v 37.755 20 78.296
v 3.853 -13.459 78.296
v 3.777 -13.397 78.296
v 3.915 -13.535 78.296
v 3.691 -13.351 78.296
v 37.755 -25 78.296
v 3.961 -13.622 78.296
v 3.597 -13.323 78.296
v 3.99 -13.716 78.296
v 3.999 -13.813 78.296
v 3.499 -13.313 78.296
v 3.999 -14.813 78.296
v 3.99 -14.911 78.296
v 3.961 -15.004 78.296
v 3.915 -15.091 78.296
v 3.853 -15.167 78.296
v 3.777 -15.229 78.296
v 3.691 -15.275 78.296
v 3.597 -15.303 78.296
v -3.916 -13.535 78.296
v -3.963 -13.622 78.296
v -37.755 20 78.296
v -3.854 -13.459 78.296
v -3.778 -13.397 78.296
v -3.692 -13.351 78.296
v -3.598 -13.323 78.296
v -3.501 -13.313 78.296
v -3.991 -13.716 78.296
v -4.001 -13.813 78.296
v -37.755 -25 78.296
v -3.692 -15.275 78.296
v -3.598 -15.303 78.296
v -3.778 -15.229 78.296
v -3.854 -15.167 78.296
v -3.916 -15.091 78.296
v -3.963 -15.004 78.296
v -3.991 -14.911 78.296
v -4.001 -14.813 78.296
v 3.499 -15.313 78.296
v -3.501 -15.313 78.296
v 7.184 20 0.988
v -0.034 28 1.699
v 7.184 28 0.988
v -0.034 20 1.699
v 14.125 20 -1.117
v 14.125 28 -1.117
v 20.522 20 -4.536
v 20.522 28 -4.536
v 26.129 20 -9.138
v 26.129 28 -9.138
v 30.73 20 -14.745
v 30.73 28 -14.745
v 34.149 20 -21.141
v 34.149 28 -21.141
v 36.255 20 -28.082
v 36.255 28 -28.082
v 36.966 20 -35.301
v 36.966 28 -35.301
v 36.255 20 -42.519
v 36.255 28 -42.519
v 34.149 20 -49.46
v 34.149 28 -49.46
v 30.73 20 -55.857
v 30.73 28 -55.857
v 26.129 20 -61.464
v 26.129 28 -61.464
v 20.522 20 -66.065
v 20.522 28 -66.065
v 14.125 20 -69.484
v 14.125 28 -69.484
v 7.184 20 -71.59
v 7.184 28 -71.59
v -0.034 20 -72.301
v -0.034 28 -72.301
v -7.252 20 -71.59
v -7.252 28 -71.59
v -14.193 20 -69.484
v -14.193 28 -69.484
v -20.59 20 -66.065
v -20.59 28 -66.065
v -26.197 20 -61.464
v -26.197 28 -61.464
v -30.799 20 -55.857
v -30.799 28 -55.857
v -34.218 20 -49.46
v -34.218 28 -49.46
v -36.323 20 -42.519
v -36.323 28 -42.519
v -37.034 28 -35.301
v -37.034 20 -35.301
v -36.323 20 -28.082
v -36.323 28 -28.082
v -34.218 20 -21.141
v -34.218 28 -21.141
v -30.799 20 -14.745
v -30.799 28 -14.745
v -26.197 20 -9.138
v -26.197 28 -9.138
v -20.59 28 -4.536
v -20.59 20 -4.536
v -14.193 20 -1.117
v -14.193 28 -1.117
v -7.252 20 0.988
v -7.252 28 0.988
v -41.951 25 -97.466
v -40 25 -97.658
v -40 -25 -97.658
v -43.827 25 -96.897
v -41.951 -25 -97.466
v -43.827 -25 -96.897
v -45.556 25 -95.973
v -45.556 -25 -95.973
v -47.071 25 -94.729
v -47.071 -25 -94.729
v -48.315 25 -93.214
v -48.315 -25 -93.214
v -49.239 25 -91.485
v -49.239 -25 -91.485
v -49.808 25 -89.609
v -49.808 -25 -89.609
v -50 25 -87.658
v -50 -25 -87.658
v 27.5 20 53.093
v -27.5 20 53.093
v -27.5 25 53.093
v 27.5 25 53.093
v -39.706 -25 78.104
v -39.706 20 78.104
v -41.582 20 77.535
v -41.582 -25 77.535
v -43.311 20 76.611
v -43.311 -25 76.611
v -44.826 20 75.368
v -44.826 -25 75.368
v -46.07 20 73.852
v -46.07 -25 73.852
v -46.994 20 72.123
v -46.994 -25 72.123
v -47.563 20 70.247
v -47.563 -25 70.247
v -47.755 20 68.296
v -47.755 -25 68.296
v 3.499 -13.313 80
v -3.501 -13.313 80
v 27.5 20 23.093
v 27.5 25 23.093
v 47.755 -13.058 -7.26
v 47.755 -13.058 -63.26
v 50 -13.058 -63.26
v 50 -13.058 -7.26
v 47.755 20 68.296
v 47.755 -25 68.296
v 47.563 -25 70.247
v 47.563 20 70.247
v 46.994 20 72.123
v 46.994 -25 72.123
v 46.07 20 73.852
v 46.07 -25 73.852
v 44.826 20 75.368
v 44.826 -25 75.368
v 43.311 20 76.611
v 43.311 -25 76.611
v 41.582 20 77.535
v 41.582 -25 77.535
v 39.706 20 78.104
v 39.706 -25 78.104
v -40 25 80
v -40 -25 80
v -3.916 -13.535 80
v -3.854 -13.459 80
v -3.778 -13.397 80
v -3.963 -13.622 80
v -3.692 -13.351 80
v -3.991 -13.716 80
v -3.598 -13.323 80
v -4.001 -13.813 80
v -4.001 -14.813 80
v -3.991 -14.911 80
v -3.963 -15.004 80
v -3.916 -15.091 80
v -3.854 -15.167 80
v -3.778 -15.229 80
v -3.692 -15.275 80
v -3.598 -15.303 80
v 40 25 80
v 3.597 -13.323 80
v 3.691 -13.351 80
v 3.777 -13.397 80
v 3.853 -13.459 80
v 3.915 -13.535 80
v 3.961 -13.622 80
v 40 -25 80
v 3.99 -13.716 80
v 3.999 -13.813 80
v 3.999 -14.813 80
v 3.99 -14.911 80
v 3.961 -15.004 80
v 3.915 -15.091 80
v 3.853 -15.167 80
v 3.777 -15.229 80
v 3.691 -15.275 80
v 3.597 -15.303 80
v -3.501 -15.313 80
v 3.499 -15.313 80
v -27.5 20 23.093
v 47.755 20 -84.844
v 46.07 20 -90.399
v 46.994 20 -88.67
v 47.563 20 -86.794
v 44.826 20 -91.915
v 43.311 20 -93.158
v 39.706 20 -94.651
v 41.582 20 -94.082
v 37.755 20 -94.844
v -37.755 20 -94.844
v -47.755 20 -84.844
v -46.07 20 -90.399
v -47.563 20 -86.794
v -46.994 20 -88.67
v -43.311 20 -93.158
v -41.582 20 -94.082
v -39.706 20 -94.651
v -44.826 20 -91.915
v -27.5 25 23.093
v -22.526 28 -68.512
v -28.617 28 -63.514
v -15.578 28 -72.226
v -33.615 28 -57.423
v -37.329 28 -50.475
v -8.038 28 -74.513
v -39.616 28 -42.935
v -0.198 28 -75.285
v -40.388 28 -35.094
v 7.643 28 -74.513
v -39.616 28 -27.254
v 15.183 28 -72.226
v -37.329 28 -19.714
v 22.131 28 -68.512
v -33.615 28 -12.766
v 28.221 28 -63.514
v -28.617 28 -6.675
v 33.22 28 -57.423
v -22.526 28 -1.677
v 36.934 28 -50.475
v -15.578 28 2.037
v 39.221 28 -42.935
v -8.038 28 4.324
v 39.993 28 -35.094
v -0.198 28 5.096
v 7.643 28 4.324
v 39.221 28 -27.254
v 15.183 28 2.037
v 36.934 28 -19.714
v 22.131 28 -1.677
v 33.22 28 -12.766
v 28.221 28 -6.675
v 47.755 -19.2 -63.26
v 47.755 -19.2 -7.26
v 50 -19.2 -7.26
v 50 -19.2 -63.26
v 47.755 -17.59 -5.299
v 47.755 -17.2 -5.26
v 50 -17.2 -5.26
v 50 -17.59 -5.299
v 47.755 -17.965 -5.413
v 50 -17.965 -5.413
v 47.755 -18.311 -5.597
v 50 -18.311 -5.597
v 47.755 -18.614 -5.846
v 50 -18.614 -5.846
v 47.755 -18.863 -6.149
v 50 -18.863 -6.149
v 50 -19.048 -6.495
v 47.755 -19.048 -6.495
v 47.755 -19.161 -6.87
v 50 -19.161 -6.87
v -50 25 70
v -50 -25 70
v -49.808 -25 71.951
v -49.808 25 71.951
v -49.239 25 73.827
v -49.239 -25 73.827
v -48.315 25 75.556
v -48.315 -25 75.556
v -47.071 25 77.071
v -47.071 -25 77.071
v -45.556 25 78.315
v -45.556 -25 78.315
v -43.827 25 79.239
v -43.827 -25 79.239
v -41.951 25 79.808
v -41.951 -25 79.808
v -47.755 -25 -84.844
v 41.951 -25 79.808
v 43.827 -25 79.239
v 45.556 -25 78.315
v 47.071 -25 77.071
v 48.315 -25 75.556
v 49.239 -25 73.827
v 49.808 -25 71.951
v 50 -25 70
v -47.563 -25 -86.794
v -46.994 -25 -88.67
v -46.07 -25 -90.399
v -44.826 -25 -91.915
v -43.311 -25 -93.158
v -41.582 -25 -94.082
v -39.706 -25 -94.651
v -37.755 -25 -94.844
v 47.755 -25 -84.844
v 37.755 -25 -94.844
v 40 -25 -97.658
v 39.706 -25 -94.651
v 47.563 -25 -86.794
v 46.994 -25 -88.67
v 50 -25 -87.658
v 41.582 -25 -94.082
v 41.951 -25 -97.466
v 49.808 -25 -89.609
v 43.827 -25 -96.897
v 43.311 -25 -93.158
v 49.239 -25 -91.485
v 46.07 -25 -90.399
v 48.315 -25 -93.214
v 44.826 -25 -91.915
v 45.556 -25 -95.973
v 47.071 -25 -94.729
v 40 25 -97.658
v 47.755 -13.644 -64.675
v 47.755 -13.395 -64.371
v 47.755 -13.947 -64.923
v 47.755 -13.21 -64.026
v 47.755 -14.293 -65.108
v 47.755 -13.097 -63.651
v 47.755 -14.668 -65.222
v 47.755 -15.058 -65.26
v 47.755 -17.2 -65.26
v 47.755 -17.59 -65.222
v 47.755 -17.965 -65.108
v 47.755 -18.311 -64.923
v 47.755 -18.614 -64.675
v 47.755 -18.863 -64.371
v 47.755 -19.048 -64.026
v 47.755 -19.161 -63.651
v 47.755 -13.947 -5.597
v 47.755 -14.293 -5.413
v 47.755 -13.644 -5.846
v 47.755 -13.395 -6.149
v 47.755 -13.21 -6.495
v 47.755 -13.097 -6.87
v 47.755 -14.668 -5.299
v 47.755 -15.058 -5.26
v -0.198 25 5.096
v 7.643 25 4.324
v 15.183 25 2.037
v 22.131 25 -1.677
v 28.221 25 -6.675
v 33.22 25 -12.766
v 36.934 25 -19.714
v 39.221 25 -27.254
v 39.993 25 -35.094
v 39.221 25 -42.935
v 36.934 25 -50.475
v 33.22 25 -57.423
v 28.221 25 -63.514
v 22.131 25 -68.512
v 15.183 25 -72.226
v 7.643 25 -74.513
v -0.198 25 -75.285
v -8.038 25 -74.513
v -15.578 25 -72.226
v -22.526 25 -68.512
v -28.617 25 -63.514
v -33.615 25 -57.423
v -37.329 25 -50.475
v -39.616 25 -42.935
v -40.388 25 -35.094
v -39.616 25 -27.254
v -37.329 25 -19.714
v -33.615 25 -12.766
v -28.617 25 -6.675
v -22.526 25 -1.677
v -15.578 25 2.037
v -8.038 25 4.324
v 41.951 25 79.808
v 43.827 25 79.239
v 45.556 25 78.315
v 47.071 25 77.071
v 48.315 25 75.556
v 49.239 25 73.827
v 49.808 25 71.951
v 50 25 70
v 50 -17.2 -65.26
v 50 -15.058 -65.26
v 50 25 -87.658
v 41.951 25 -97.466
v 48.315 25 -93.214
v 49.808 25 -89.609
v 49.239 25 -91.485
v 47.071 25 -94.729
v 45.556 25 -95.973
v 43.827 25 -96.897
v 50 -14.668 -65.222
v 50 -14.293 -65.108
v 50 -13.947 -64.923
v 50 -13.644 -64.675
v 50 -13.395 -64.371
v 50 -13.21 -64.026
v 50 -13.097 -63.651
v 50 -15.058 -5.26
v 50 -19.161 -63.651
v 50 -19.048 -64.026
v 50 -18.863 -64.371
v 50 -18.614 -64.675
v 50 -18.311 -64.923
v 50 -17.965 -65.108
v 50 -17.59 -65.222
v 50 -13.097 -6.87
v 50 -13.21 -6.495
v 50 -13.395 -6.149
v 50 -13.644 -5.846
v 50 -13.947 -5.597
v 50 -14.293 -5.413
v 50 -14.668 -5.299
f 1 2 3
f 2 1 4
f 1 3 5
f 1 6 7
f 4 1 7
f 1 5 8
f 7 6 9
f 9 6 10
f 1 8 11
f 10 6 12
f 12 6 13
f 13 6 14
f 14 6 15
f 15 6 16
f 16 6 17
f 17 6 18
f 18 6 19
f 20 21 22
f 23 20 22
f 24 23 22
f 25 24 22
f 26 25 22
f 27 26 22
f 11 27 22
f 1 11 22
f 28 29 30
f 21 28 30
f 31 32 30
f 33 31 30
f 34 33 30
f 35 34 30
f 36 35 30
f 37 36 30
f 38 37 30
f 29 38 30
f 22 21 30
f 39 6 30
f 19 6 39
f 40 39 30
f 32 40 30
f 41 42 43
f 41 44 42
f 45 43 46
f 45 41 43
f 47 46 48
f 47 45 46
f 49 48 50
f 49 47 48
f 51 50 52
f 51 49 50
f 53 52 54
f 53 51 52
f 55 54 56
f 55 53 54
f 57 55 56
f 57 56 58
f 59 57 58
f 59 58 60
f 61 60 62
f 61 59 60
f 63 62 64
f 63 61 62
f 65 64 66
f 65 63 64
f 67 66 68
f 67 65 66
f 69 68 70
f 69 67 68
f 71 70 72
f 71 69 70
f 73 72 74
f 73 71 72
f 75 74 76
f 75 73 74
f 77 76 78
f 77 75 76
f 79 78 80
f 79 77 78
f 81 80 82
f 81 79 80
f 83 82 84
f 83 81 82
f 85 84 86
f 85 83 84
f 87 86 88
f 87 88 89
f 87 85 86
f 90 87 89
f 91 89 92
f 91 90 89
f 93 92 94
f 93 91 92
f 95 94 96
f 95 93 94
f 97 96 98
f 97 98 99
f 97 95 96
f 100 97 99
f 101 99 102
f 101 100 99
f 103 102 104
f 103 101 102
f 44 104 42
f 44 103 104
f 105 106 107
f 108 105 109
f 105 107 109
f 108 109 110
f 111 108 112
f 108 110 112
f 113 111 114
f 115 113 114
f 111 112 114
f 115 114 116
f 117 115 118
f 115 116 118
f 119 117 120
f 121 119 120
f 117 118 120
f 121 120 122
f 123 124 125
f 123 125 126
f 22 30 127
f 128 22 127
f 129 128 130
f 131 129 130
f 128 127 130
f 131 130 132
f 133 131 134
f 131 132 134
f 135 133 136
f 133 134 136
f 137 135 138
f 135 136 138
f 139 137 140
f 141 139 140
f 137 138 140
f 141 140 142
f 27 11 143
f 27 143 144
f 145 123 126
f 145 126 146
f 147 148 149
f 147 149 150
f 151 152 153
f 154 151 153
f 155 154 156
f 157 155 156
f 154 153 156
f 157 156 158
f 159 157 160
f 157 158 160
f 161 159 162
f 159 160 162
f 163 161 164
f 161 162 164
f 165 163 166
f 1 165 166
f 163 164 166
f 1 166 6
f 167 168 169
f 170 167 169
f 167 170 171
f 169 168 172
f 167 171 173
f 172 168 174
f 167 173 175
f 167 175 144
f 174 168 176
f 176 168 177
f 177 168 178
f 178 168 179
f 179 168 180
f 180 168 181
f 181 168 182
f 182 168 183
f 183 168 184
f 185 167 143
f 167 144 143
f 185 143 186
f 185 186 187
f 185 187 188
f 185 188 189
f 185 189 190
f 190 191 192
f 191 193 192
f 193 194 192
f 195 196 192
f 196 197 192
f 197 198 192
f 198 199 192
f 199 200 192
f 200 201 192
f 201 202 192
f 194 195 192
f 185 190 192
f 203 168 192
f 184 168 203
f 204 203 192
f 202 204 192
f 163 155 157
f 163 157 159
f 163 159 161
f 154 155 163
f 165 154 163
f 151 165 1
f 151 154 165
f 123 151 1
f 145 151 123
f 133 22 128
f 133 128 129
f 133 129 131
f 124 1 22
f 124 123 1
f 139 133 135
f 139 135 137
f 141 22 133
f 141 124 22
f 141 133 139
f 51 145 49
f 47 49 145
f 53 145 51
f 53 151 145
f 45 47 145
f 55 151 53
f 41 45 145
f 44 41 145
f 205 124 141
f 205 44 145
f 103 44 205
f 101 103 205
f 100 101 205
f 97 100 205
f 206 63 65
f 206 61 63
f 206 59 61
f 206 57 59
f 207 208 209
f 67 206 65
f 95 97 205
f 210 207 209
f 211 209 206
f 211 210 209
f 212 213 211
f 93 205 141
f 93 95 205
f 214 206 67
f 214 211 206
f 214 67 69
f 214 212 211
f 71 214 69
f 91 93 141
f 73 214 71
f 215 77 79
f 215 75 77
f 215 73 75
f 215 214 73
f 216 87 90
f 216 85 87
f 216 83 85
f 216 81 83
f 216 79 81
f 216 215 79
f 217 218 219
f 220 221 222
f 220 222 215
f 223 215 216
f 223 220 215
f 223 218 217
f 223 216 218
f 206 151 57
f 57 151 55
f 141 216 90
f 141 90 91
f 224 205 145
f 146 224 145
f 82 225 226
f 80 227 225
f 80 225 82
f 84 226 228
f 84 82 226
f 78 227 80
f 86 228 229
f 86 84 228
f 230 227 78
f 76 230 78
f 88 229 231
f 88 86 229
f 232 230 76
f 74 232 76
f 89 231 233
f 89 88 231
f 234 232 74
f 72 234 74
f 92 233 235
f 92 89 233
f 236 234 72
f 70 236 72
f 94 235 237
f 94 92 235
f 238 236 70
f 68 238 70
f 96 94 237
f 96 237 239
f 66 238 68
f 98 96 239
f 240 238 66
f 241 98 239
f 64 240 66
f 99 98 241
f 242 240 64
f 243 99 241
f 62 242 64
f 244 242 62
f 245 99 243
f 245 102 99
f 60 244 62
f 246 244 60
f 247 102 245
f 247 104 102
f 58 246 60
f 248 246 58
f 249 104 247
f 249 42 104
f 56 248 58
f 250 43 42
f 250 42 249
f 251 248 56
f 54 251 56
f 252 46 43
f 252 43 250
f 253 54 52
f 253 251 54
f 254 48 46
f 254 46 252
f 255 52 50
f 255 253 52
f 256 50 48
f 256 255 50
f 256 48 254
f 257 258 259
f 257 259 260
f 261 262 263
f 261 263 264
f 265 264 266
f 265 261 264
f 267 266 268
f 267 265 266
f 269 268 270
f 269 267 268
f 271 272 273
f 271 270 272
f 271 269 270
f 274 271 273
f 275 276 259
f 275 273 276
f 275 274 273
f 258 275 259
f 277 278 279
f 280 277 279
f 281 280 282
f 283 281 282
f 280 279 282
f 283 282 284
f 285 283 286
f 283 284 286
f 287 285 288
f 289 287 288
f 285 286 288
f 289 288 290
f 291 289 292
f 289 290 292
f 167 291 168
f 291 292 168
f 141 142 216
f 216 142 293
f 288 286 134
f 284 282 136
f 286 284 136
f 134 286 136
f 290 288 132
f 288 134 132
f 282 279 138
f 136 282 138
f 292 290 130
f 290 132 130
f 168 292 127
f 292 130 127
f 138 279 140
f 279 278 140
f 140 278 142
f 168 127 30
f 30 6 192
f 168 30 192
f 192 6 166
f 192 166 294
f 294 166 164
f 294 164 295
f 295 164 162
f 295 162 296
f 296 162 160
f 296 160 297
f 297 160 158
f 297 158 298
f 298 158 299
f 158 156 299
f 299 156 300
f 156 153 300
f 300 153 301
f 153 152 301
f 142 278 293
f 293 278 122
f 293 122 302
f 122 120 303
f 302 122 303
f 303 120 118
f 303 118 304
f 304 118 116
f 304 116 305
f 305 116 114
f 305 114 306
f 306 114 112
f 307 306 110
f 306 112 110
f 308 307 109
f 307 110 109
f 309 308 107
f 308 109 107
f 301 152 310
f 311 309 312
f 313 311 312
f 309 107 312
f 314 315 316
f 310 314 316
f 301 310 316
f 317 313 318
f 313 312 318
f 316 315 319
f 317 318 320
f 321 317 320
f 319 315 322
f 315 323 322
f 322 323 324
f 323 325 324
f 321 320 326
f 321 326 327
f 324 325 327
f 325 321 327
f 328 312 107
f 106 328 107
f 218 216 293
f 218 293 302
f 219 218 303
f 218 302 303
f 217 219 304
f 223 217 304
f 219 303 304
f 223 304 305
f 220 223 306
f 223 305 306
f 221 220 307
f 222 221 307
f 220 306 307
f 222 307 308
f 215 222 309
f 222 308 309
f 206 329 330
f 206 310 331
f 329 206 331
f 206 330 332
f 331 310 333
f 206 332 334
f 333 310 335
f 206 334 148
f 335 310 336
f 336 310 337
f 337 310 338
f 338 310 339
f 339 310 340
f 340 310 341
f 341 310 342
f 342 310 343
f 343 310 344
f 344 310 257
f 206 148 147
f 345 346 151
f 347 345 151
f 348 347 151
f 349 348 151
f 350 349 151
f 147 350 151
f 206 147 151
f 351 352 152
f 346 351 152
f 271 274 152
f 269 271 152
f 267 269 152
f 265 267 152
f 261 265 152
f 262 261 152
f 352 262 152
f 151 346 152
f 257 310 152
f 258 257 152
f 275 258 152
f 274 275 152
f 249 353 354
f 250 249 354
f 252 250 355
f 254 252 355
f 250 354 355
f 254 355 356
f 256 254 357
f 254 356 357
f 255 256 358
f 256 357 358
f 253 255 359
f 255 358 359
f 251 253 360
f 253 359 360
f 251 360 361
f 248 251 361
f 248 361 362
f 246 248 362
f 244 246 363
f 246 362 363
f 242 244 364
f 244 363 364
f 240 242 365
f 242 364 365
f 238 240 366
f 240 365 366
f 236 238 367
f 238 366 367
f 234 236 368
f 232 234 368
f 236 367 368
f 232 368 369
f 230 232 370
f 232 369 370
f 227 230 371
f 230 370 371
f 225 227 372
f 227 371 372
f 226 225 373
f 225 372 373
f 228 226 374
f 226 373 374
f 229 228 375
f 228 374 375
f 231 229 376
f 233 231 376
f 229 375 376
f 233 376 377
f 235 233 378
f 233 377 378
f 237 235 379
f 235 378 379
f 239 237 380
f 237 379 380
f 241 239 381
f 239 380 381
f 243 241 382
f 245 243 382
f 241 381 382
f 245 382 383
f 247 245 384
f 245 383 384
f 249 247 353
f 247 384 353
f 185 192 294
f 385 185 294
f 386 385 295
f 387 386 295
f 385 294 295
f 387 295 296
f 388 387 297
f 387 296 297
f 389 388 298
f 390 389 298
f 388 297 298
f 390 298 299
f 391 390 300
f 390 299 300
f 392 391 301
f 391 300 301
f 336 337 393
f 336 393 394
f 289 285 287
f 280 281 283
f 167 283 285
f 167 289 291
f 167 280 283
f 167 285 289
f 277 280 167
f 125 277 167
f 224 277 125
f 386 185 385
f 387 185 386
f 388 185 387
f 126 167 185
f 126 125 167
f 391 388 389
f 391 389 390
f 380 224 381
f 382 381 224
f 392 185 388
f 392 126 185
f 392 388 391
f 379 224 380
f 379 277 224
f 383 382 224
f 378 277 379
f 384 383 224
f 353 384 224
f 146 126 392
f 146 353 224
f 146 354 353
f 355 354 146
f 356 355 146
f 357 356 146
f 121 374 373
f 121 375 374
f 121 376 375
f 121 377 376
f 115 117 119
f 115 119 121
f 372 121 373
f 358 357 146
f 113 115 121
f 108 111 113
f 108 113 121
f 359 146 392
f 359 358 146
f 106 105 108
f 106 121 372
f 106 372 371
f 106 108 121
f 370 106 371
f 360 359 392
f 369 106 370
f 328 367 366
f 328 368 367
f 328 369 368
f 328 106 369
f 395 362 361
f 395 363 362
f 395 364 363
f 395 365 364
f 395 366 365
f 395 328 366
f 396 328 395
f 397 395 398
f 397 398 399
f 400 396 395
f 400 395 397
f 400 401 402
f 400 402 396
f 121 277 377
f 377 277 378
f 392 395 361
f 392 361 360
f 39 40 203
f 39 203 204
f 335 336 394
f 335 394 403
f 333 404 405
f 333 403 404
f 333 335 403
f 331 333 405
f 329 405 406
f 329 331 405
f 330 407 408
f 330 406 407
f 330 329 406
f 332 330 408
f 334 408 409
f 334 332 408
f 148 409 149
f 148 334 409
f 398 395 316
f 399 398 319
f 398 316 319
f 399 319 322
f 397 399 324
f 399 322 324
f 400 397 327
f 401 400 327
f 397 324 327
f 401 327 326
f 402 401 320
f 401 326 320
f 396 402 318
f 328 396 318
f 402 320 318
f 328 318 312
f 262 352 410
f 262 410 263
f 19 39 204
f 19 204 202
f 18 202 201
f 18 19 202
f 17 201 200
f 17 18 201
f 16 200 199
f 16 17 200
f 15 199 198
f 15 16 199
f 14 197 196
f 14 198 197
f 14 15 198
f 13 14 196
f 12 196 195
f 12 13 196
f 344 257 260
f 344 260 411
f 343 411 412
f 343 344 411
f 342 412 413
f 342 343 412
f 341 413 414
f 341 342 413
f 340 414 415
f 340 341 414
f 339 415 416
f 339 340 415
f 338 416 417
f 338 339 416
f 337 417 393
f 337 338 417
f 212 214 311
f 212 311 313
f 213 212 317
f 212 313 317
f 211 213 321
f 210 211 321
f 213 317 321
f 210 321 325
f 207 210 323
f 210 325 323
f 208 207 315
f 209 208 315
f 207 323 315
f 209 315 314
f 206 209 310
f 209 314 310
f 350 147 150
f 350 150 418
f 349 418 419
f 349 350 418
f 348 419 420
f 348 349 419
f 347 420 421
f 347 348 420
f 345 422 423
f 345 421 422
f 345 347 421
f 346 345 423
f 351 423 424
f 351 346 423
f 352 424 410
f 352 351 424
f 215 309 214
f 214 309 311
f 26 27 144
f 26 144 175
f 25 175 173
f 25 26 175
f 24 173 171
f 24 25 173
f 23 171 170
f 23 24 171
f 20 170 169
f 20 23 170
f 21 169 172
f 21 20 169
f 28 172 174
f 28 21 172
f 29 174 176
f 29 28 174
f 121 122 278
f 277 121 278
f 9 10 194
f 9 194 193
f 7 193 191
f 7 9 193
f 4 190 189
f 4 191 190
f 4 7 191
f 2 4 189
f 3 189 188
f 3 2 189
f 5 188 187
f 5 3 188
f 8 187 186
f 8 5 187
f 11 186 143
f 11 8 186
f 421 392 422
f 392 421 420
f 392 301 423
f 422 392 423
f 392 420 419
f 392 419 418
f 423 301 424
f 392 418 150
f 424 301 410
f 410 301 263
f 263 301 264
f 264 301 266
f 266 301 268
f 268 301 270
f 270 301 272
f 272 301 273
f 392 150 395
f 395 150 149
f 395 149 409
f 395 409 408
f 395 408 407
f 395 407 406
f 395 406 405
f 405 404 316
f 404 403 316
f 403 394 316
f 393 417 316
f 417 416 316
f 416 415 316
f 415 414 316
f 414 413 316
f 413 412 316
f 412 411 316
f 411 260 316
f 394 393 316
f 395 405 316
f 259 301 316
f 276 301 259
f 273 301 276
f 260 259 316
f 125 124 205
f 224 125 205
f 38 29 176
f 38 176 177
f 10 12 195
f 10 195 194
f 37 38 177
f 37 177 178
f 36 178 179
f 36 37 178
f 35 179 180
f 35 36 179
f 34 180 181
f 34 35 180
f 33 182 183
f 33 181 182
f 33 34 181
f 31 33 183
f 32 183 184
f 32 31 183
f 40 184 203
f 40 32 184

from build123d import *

# Parameters (mm, degrees)
BOSS_EXTRUDE1_DEPTH      = 25
BOSS_EXTRUDE1_DEPTH_BACK = 25
SKETCH8_R                = 37
SKETCH8_W                = 55
SKETCH8_H                = 30
CUT_EXTRUDE1_DEPTH       = 20
CUT_EXTRUDE1_DEPTH_BACK  = 35
CUT_EXTRUDE2_DEPTH       = 65
CUT_EXTRUDE4_DEPTH       = 113.525762116
SKETCH16_R               = 40.190590084
SKETCH16_R_2             = 37
BOSS_EXTRUDE3_DEPTH      = 3


with BuildPart() as part:
    # Sketch8 → Boss-Extrude1 (new, two sides: drawn at the far end of the back side and taken through both)
    with BuildSketch(Plane(origin=(0, 0, 0), x_dir=(1, 0, 0), z_dir=(0, 1, 0)).offset(-BOSS_EXTRUDE1_DEPTH_BACK)):
        with BuildLine():
            Line((-13.333333333, 97.657806344), (-40, 97.657806344))
            ThreePointArc((-40, 97.657806344), (-47.071067812, 94.728874155), (-50, 87.657806344))
            Line((-50, 87.657806344), (-50, 8.828903172))
            Line((-50, 8.828903172), (-50, -70))
            ThreePointArc((-50, -70), (-47.071067812, -77.071067812), (-40, -80))
            Line((-40, -80), (40, -80))
            ThreePointArc((40, -80), (47.071067812, -77.071067812), (50, -70))
            Line((50, -70), (50, 8.828903172))
            Line((50, 8.828903172), (50, 87.657806344))
            ThreePointArc((50, 87.657806344), (47.071067812, 94.728874155), (40, 97.657806344))
            Line((40, 97.657806344), (13.333333333, 97.657806344))
            Line((13.333333333, 97.657806344), (-13.333333333, 97.657806344))
        make_face()
        with Locations(Location((-0.034150482, 35.300694554, 0), (0, 0, 270))):
            Circle(SKETCH8_R, mode=Mode.SUBTRACT)
        with Locations((0, -38.093187293)):
            Rectangle(SKETCH8_W, SKETCH8_H, mode=Mode.SUBTRACT)
    extrude(amount=BOSS_EXTRUDE1_DEPTH + BOSS_EXTRUDE1_DEPTH_BACK)

    # Sketch14 → Cut-Extrude1 (cut, two sides: drawn at the far end of the back side and taken through both)
    with BuildSketch(Plane(origin=(0, 0, 0), x_dir=(1, 0, 0), z_dir=(0, 1, 0)).offset(-CUT_EXTRUDE1_DEPTH_BACK)):
        with BuildLine():
            Line((-37.755307684, 94.843507168), (37.755307684, 94.843507168))
            ThreePointArc((37.755307684, 94.843507168), (44.826375496, 91.91457498), (47.755307684, 84.843507168))
            Line((47.755307684, 84.843507168), (47.755307684, -68.296492832))
            ThreePointArc((47.755307684, -68.296492832), (44.826375496, -75.367560643), (37.755307684, -78.296492832))
            Line((37.755307684, -78.296492832), (-37.755307684, -78.296492832))
            ThreePointArc((-37.755307684, -78.296492832), (-44.826375496, -75.367560643), (-47.755307684, -68.296492832))
            Line((-47.755307684, -68.296492832), (-47.755307684, 84.843507168))
            ThreePointArc((-47.755307684, 84.843507168), (-44.826375496, 91.91457498), (-37.755307684, 94.843507168))
        make_face()
    extrude(amount=CUT_EXTRUDE1_DEPTH + CUT_EXTRUDE1_DEPTH_BACK, mode=Mode.SUBTRACT)

    # Sketch15 → Cut-Extrude2 (cut)
    with BuildSketch(Plane(origin=(0, 0, 0), x_dir=(0, 0, -1), z_dir=(1, 0, 0))):
        with BuildLine():
            Line((63.260342579, -13.058175161), (7.260342579, -13.058175161))
            ThreePointArc((7.260342579, -13.058175161), (5.846129016, -13.643961598), (5.260342579, -15.058175161))
            Line((5.260342579, -15.058175161), (5.260342579, -17.199912978))
            ThreePointArc((5.260342579, -17.199912978), (5.846129016, -18.61412654), (7.260342579, -19.199912978))
            Line((7.260342579, -19.199912978), (63.260342579, -19.199912978))
            ThreePointArc((63.260342579, -19.199912978), (64.674556141, -18.61412654), (65.260342579, -17.199912978))
            Line((65.260342579, -17.199912978), (65.260342579, -15.058175161))
            ThreePointArc((65.260342579, -15.058175161), (64.674556141, -13.643961598), (63.260342579, -13.058175161))
        make_face()
    extrude(amount=CUT_EXTRUDE2_DEPTH, mode=Mode.SUBTRACT)

    # Sketch9 → Cut-Extrude4 (cut, through all)
    with BuildSketch(Plane.XY):
        with BuildLine():
            Line((3.499295318, -13.313051471), (-3.500704682, -13.313051471))
            ThreePointArc((-3.500704682, -13.313051471), (-3.854258072, -13.45949808), (-4.000704682, -13.813051471))
            Line((-4.000704682, -13.813051471), (-4.000704682, -14.813051471))
            ThreePointArc((-4.000704682, -14.813051471), (-3.854258072, -15.166604861), (-3.500704682, -15.313051471))
            Line((-3.500704682, -15.313051471), (3.499295318, -15.313051471))
            ThreePointArc((3.499295318, -15.313051471), (3.852848709, -15.166604861), (3.999295318, -14.813051471))
            Line((3.999295318, -14.813051471), (3.999295318, -13.813051471))
            ThreePointArc((3.999295318, -13.813051471), (3.852848709, -13.45949808), (3.499295318, -13.313051471))
        make_face()
    extrude(amount=CUT_EXTRUDE4_DEPTH, mode=Mode.SUBTRACT)

    # Sketch16 → Boss-Extrude3 (add)
    with BuildSketch(Plane(origin=(0, 25, 0), x_dir=(1, 0, 0), z_dir=(0, 1, 0))):
        with Locations(Location((-0.197566829, 35.094491393, 0), (0, 0, 270))):
            Circle(SKETCH16_R)
        with Locations(Location((-0.034150482, 35.300694554, 0), (0, 0, 270))):
            Circle(SKETCH16_R_2, mode=Mode.SUBTRACT)
    extrude(amount=BOSS_EXTRUDE3_DEPTH)


solid = part.part
